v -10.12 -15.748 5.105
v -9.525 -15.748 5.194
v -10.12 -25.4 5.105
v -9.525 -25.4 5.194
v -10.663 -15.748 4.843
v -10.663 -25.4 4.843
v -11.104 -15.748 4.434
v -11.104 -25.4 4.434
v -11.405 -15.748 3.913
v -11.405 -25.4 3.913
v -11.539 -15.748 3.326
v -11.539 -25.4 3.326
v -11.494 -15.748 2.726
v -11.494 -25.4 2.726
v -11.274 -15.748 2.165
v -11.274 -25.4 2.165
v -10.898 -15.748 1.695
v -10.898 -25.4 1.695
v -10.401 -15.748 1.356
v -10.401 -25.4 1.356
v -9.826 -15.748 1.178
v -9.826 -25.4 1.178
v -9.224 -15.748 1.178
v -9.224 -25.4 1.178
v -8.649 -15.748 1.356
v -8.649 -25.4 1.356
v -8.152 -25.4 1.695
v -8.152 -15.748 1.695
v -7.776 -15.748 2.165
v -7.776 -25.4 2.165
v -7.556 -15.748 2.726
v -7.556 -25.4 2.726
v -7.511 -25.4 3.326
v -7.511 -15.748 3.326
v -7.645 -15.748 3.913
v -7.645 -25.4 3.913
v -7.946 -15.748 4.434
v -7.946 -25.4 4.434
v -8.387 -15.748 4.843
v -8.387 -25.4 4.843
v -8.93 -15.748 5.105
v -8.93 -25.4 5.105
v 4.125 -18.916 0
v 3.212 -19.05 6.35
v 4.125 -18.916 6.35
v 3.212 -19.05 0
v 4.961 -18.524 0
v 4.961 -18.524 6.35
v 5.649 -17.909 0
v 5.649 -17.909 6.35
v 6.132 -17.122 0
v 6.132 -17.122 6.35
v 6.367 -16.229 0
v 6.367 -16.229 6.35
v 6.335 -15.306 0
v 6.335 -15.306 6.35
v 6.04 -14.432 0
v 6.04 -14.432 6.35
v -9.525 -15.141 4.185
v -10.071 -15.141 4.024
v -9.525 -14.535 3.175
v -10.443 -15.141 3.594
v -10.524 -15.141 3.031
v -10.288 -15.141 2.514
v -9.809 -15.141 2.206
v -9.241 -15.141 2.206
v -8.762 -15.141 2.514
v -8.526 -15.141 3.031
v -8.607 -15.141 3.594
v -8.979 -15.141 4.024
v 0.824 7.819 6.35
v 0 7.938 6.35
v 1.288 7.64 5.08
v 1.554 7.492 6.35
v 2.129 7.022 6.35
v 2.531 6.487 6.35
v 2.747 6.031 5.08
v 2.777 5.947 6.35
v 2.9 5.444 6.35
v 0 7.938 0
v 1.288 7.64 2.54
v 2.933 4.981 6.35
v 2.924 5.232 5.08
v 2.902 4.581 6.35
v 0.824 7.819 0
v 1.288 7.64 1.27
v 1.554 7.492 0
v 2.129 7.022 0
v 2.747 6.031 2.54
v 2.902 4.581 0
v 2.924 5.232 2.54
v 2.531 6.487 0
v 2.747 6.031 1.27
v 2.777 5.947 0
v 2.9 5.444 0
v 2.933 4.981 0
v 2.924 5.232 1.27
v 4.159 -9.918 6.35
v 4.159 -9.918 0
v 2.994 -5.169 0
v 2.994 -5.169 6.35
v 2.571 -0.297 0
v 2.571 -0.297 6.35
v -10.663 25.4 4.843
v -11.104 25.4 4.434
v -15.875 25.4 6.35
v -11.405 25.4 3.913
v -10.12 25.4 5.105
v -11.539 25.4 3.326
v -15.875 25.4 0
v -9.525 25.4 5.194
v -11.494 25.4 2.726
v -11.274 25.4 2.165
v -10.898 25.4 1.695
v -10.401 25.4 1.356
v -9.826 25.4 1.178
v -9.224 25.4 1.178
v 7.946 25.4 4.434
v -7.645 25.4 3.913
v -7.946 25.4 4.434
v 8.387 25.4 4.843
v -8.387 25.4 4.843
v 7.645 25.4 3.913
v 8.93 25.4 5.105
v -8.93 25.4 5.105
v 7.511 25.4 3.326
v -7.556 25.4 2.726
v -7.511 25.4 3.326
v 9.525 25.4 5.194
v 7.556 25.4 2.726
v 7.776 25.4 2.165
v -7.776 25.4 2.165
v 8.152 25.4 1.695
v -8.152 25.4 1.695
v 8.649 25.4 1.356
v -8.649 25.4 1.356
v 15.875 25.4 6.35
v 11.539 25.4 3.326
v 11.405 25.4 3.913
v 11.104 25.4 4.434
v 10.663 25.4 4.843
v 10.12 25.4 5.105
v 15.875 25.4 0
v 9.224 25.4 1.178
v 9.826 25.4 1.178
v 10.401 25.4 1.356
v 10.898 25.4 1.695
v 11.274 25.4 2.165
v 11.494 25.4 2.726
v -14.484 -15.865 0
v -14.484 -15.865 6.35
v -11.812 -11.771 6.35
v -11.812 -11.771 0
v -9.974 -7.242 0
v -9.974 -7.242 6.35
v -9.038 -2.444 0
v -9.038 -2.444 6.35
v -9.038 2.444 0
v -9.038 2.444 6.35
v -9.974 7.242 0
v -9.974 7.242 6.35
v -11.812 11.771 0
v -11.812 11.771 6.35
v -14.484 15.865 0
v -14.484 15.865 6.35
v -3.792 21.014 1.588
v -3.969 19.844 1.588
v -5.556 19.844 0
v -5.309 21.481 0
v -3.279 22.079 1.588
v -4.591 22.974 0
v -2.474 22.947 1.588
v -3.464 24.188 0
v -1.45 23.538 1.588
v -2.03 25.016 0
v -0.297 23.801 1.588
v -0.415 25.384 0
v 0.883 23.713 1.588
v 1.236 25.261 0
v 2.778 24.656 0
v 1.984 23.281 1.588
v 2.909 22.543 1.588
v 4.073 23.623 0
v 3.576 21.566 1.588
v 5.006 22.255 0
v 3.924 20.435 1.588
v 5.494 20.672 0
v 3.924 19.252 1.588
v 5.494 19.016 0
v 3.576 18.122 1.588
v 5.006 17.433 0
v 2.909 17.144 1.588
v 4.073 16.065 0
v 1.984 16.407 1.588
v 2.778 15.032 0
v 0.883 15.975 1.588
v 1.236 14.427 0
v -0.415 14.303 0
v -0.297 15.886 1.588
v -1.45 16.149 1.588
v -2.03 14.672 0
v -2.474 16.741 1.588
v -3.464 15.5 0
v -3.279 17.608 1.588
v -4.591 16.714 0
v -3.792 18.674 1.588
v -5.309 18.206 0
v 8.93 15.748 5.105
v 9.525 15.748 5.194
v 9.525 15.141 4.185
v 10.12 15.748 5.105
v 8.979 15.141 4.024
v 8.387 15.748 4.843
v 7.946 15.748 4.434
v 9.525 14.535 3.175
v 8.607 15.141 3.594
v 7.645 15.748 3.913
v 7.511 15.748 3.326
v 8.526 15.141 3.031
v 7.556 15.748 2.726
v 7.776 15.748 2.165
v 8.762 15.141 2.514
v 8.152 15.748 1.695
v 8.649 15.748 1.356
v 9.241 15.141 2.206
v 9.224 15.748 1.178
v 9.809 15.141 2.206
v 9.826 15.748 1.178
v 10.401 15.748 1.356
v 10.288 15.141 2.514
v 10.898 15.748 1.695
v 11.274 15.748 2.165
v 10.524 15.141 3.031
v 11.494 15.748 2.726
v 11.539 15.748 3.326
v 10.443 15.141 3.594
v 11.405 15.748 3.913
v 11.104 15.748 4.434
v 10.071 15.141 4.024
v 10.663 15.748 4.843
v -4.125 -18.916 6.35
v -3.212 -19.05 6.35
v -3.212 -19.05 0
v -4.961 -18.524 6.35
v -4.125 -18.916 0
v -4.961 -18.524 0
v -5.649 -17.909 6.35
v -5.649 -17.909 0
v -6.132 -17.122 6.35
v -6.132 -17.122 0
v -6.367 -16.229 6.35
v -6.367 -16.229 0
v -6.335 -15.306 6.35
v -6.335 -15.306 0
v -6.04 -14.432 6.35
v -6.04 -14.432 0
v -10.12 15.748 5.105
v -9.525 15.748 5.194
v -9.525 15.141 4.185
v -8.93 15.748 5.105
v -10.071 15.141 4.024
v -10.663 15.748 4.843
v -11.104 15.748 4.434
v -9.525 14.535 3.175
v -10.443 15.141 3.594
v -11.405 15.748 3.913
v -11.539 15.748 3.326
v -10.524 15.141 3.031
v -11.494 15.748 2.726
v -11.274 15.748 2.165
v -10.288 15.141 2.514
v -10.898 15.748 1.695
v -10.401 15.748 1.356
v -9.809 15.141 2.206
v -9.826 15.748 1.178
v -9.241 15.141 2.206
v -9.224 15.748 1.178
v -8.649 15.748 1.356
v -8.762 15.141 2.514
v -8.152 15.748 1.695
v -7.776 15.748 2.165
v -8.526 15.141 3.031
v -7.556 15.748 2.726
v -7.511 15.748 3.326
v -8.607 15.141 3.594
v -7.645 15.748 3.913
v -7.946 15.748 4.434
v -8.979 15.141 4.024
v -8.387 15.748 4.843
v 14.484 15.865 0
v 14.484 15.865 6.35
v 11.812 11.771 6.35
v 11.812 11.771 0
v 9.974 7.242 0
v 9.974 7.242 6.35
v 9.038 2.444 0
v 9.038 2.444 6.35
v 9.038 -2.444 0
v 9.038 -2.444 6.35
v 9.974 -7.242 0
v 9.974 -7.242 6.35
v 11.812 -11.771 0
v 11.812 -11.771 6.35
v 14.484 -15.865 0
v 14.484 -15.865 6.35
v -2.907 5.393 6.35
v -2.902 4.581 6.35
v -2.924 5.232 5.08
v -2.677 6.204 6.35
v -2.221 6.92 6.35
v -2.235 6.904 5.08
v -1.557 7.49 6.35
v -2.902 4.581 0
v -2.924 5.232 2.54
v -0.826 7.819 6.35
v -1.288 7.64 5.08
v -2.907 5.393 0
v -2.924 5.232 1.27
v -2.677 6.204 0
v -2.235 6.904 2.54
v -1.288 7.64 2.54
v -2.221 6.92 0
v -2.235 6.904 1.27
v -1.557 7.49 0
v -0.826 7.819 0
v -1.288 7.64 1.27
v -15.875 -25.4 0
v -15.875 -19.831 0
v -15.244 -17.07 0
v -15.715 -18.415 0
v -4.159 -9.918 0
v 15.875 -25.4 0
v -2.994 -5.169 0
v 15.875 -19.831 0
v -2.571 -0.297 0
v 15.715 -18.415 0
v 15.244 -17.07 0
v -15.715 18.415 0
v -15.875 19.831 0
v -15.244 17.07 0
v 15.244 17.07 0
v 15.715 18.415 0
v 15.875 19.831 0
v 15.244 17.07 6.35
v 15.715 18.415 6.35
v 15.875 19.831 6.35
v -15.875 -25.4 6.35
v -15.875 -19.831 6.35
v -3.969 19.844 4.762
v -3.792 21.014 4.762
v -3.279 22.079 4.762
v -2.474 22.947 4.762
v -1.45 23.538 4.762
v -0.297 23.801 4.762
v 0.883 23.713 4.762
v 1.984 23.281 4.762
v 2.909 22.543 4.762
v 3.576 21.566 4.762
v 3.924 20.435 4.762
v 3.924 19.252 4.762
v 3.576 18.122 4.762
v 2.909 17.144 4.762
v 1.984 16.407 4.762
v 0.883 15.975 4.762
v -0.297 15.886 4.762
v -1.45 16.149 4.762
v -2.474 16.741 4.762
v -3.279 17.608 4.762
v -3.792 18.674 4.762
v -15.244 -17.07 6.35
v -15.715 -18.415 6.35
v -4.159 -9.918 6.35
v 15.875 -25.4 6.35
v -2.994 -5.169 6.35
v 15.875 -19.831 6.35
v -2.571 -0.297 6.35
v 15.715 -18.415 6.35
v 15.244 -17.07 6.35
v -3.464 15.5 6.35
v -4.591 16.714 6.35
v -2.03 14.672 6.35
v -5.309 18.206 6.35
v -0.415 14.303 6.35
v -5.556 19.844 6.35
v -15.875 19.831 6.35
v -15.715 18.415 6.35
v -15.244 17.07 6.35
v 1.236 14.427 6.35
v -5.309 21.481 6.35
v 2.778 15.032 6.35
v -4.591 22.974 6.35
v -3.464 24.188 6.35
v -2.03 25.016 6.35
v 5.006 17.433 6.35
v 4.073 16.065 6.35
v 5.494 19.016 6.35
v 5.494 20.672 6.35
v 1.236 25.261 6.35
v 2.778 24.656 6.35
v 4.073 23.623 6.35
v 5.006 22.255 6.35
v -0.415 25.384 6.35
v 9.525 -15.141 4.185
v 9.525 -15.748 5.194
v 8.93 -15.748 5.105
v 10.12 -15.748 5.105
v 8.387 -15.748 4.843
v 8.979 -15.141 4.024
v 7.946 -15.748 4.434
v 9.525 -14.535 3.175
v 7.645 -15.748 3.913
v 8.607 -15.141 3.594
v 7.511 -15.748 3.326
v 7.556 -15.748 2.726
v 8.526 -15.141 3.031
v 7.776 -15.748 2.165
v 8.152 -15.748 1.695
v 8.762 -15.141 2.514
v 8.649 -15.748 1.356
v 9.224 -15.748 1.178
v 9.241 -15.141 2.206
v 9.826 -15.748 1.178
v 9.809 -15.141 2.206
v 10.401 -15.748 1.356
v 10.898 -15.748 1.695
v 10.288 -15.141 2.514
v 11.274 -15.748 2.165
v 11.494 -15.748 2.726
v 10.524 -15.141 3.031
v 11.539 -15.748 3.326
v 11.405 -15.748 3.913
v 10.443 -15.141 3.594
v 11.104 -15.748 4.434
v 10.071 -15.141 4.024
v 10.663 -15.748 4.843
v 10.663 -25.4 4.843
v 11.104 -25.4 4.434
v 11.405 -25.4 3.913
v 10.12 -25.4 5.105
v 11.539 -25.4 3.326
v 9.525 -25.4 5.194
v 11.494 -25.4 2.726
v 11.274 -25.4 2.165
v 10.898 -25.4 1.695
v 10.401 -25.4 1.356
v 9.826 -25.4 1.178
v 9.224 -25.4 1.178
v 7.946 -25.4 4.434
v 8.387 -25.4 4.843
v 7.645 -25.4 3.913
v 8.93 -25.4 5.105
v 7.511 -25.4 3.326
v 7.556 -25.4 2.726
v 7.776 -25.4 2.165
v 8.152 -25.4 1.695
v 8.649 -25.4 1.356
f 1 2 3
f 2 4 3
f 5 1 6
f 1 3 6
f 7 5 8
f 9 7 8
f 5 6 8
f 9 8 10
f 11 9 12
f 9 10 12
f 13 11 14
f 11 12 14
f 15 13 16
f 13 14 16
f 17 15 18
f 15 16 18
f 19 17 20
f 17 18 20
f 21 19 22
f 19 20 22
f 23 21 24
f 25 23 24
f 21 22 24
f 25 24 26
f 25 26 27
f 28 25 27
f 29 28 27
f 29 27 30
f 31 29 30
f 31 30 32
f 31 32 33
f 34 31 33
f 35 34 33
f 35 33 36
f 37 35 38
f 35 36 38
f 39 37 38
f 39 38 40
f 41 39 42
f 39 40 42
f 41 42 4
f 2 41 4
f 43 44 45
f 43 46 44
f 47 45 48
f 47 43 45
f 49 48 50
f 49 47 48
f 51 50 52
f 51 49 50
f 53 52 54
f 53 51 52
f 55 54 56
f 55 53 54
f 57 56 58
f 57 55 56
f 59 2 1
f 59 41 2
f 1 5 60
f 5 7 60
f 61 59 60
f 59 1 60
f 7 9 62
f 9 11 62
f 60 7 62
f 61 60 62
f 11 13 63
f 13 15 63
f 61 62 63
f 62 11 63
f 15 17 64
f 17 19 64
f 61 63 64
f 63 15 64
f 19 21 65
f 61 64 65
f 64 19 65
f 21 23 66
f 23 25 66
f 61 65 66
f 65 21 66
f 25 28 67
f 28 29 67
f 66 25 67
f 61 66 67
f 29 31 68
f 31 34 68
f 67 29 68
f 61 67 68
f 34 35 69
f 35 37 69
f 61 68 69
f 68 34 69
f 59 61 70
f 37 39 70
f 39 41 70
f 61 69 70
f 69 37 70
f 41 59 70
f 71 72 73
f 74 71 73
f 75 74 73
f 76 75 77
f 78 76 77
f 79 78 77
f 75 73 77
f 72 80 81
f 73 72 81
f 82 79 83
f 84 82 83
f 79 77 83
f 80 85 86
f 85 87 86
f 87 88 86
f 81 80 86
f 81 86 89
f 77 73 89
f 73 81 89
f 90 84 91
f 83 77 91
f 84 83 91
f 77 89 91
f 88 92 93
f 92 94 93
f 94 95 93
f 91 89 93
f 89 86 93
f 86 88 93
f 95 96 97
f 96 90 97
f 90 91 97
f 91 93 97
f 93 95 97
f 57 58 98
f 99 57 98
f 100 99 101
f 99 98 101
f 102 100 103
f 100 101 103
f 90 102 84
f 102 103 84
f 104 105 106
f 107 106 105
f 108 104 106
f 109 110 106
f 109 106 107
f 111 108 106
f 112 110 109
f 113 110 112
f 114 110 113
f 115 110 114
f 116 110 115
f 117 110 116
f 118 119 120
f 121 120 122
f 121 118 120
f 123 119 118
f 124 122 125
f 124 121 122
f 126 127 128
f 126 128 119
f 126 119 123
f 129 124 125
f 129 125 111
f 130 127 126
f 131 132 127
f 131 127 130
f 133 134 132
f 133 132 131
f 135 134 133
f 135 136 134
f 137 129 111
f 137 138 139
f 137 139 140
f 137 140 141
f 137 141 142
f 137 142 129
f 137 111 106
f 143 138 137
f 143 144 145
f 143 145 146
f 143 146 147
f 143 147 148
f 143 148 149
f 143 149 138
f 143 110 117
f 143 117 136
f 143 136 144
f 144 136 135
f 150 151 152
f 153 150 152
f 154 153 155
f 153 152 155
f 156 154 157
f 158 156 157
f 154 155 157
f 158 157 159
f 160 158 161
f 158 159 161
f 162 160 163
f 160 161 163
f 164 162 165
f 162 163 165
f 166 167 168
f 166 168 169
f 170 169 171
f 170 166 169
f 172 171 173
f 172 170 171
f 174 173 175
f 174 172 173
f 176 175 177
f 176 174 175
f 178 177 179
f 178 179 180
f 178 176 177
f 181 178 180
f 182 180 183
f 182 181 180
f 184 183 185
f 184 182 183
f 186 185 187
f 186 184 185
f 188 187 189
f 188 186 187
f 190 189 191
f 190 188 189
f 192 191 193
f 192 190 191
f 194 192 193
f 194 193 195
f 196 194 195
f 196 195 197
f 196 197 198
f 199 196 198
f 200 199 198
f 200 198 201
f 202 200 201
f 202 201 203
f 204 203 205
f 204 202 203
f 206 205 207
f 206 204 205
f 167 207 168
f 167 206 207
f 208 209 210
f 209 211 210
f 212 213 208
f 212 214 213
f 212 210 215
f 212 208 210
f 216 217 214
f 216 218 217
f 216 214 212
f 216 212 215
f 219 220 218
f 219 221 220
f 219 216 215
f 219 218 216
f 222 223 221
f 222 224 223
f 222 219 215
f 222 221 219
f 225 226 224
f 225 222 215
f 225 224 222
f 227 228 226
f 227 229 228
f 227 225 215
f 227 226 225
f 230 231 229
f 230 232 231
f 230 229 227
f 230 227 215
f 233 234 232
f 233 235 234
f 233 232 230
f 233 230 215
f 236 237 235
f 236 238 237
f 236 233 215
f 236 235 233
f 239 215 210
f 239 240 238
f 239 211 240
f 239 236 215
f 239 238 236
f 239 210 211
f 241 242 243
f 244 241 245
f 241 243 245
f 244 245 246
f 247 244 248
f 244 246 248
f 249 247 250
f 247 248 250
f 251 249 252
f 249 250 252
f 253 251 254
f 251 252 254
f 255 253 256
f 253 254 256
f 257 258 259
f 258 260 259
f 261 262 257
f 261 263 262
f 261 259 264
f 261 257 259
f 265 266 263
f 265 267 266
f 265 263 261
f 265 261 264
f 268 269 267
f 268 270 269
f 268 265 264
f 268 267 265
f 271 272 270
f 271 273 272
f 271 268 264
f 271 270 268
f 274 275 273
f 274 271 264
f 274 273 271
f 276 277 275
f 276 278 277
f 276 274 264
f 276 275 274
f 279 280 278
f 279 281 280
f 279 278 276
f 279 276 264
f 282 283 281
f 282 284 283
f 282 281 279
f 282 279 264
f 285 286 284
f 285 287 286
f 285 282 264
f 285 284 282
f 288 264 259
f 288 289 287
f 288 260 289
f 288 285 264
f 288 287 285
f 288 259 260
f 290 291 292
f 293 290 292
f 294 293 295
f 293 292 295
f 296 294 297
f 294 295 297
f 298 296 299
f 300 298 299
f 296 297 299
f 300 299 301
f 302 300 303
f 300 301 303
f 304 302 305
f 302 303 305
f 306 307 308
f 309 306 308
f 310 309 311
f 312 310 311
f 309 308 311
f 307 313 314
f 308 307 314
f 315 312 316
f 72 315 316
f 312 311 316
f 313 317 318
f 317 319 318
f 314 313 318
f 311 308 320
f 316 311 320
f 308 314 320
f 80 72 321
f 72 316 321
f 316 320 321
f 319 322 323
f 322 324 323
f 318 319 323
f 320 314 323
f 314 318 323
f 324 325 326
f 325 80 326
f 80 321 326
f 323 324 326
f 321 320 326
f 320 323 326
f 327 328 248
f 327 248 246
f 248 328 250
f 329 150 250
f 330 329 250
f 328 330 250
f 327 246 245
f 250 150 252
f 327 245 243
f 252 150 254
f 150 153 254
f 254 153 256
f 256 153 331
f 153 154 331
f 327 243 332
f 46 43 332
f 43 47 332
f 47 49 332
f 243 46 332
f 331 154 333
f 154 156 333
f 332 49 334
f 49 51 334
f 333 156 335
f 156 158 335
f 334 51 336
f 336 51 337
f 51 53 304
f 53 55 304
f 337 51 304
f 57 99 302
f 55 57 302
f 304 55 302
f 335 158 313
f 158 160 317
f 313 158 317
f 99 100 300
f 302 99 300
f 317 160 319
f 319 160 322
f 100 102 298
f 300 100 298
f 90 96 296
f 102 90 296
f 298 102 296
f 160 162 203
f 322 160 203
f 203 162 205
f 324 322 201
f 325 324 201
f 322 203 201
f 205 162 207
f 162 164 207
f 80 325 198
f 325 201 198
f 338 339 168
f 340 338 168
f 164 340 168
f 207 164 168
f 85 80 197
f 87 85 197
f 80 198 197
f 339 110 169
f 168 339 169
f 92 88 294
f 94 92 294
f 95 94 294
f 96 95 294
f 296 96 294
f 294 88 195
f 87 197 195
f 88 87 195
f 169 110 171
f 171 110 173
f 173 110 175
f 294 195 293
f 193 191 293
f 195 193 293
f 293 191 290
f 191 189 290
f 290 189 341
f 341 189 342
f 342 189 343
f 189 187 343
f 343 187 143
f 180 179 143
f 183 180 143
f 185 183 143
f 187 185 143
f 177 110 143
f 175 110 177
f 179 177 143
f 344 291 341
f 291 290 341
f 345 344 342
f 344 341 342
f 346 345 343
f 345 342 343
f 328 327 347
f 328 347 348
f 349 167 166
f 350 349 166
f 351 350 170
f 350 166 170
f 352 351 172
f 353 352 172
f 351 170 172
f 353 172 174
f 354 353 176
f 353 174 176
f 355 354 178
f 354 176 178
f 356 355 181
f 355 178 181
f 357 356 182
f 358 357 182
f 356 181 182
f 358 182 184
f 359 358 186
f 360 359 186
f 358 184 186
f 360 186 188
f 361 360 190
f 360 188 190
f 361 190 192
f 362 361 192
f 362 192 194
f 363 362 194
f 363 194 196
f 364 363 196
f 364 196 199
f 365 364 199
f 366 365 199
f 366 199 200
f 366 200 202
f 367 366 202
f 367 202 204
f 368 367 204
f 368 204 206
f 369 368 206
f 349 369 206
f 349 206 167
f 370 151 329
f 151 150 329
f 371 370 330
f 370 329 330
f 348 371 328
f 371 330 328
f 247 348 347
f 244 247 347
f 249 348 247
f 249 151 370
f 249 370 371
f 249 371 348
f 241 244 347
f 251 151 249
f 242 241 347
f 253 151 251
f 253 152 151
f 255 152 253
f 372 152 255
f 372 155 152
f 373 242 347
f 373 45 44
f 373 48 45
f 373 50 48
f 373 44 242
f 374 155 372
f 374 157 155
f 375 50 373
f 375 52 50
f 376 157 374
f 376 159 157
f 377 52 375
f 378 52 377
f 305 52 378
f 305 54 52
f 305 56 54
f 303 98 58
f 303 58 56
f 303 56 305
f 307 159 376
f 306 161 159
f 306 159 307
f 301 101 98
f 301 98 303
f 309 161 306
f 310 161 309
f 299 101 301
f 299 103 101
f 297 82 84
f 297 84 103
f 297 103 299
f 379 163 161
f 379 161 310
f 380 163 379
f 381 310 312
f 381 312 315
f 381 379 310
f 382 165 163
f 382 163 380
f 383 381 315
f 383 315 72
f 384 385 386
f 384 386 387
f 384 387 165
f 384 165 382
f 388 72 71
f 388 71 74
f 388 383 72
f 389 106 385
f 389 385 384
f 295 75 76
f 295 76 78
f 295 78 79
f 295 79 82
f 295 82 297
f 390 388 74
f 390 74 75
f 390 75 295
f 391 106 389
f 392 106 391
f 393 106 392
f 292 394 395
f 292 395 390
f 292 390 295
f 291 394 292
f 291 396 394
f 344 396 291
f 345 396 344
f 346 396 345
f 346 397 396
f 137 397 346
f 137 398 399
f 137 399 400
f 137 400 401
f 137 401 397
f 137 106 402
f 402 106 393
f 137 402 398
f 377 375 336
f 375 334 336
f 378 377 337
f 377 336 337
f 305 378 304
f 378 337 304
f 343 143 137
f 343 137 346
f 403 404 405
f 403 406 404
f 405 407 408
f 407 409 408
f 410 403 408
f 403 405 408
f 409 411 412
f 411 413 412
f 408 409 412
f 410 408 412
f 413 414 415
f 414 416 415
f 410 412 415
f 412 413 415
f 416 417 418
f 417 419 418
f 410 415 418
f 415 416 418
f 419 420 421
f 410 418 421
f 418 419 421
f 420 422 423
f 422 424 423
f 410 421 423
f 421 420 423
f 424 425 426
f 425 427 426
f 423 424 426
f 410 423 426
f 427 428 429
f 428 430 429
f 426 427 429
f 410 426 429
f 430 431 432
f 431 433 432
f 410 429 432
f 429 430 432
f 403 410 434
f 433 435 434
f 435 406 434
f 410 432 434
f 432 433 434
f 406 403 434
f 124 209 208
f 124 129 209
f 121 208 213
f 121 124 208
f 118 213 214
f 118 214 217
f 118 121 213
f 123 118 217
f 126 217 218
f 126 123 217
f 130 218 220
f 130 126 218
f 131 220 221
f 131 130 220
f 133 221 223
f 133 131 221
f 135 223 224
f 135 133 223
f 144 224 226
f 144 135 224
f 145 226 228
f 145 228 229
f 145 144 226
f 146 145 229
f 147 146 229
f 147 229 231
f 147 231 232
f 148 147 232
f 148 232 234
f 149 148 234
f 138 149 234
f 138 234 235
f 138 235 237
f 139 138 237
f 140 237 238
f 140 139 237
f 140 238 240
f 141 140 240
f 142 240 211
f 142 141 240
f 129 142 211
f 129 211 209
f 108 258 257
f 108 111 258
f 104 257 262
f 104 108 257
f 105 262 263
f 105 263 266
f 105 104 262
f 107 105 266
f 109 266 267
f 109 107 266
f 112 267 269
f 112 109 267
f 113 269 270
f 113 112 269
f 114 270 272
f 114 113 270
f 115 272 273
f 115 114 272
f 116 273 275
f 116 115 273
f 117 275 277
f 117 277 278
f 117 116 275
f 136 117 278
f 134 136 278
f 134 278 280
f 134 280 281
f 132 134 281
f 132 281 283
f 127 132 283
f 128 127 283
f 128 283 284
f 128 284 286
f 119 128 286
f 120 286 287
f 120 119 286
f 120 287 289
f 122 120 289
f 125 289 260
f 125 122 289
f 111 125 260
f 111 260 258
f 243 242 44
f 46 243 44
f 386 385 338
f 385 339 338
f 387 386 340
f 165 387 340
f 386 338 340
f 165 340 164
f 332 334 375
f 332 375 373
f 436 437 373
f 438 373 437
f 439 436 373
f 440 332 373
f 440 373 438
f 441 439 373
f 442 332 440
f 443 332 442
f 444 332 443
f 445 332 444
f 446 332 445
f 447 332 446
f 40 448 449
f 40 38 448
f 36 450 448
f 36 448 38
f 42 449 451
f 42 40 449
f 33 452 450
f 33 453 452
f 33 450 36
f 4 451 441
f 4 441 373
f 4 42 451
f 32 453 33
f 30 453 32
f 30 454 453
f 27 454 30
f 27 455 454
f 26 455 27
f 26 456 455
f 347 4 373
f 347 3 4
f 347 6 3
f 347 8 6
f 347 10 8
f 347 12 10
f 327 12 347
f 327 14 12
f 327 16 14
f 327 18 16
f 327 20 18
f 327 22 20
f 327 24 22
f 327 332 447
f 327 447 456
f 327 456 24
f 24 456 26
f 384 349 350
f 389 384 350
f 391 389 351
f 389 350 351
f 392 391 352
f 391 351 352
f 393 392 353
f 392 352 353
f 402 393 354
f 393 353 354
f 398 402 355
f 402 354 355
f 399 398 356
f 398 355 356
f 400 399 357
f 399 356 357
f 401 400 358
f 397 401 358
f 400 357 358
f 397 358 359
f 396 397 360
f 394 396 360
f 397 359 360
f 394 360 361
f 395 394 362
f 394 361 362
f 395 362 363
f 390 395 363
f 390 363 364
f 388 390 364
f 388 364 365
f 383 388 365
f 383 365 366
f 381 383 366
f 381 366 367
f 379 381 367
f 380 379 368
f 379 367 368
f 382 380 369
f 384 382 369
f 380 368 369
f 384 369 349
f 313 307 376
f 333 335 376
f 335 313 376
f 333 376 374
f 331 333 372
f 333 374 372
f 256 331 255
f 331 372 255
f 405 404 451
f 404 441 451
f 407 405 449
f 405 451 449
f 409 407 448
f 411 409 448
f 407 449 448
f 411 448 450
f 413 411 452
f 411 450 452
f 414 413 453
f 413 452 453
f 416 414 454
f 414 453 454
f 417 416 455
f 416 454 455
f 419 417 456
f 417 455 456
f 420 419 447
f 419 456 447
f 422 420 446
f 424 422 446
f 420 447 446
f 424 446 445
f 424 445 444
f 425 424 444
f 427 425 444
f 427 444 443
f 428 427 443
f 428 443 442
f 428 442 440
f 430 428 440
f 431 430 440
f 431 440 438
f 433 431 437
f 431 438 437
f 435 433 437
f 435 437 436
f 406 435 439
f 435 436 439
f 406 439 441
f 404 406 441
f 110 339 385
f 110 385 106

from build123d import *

# Parameters (mm, degrees)
BOSS_EXTRUDE1_DEPTH                = 6.35
F_10_32_TAPPED_HOLE1_AT_2_COUNT    = 2
F_10_32_TAPPED_HOLE1_AT_2_PITCH    = 19.05
F_5_16_0_3125_DIAMETER_HOLE1_D     = 7.9375
F_5_16_0_3125_DIAMETER_HOLE1_DEPTH = 10.668
F_5_16_0_3125_DIAMETER_HOLE1_TIP   = 2.38466558176563
CHAMFER1_SIZE                      = 1.5875
CUT_EXTRUDE1_DEPTH                 = 31.61859116615264
FILLET1_R                          = 6.35
CUT_EXTRUDE2_DEPTH                 = 31.61859116615264
FILLET2_R                          = 3.175
FILLET3_DEPTH                      = 6.35


with BuildPart() as part:
    # Sketch1 → Boss-Extrude1 (new body)
    with BuildSketch(Plane.XY):
        Polygon((-15.875000000000007, 25.400000000000006), (15.874999999999993, 25.400000000000006), (15.875, -25.39999999999999), (-15.875, -25.39999999999999), align=None)
    extrude(amount=BOSS_EXTRUDE1_DEPTH)

    # Sketch3 → #10-32 Tapped Hole1 (revolve, cut)
    with BuildSketch(Plane(origin=(-9.525000000000007, 25.400000000000006, 3.175000000000004), x_dir=(0, 0, 1), z_dir=(1, 0, 0))):
        Polygon((0, 0), (-2.66e-15, 10.865317848002352), (2.0192999999999977, 9.652), (2.0192999999999985, 4e-17), align=None)
    f_10_32_tapped_hole1 = revolve(axis=Axis((-9.525000000000007, 31.749999999999996, 3.175000000000004), (0, -1, 0)), mode=Mode.SUBTRACT)

    # #10-32 Tapped Hole1 at 2: #10-32 Tapped Hole1 ×2
    with Locations(*[(i * F_10_32_TAPPED_HOLE1_AT_2_PITCH, 0, 0) for i in range(1, F_10_32_TAPPED_HOLE1_AT_2_COUNT)]):
        add(f_10_32_tapped_hole1, mode=Mode.SUBTRACT)

    # 5/16 (0.3125) Diameter Hole1
    with Locations(Plane.XY.offset(6.35)):
        with Locations((0, 19.84375)):
            Hole(F_5_16_0_3125_DIAMETER_HOLE1_D / 2, depth=F_5_16_0_3125_DIAMETER_HOLE1_DEPTH)
            with Locations((0, 0, -(F_5_16_0_3125_DIAMETER_HOLE1_DEPTH + F_5_16_0_3125_DIAMETER_HOLE1_TIP / 2))):  # 118° drill point
                Cone(0, F_5_16_0_3125_DIAMETER_HOLE1_D / 2, F_5_16_0_3125_DIAMETER_HOLE1_TIP, mode=Mode.SUBTRACT)

    # Chamfer1
    chamfer1_edges = [part.edges().sort_by_distance(p)[0] for p in [
        (3.96875, 19.84375, 0),
        (3.96875, 19.84375, 6.35),
    ]]
    chamfer(chamfer1_edges, length=CHAMFER1_SIZE)

    # Sketch6 → Cut-Extrude1 (cut, through all)
    with BuildSketch(Plane.XY.offset(6.35)):
        with BuildLine():
            Line((-15.875000000000007, 17.462500000000006), (-15.875000000000007, 3.55e-15))
            Line((-15.875000000000007, 3.39e-15), (-8.92008318631283, 4.67e-15))
            ThreePointArc((-8.920083186312826, 3.5971e-13), (-10.722783415657506, 9.398268113531895), (-15.875000000000007, 17.462500000000006))
        make_face()
        with BuildLine():
            Line((-8.92008318631283, 4.67e-15), (-15.875000000000007, 3.39e-15))
            Line((-15.875000000000007, 3.55e-15), (-15.875000000000007, -17.462500000000006))
            ThreePointArc((-15.87500000000001, -17.46250000000001), (-10.722783415657375, -9.39826811353156), (-8.920083186312826, 3.5971e-13))
        make_face()
        with BuildLine():
            ThreePointArc((15.875000000000004, 17.462499999999984), (10.722783415657386, 9.39826811353155), (8.920083186312844, -3.4461e-13))
            Line((8.920083186312851, 7.94e-15), (15.875, 9.22e-15))
            Line((15.875000000000004, 1.066e-14), (15.875000000000004, 17.462499999999984))
        make_face()
        with BuildLine():
            Line((15.875, 9.22e-15), (8.920083186312851, 7.94e-15))
            ThreePointArc((8.920083186312844, -3.4461e-13), (10.722783415657513, -9.398268113531874), (15.875, -17.462499999999984))
            Line((15.875000000000004, -17.462499999999984), (15.875000000000004, 1.066e-14))
        make_face()
    extrude(amount=-CUT_EXTRUDE1_DEPTH, mode=Mode.SUBTRACT)

    # Fillet1
    fillet1_edges = [part.edges().sort_by_distance(p)[0] for p in [
        (15.875000000000002, -17.462499999999984, 3.175),
        (15.875000000000004, 17.462499999999984, 3.175),
        (-15.875000000000009, -17.46250000000001, 3.175),
        (-15.875000000000005, 17.462500000000006, 3.175),
    ]]
    fillet(fillet1_edges, radius=FILLET1_R)

    # Sketch7 → Cut-Extrude2 (cut, through all)
    with BuildSketch(Plane.XY.offset(6.35)):
        with BuildLine():
            Line((-8.92008318631281, -19.04999999999999), (8.920083186312835, -19.049999999999986))
            ThreePointArc((8.920083186312835, -19.049999999999986), (3.1152594113270133, -5.858453138165378), (3.7402393989355516, 8.540237346795667))
            ThreePointArc((3.7402393989355516, 8.540237346795667), (6.02e-15, 7.937499999999989), (-3.740239398935539, 8.540237346795662))
            ThreePointArc((-3.740239398935539, 8.540237346795662), (-3.1152594113270027, -5.858453138165384), (-8.92008318631281, -19.04999999999999))
        make_face()
    extrude(amount=-CUT_EXTRUDE2_DEPTH, mode=Mode.SUBTRACT)

    # Fillet2
    fillet2_edges = [part.edges().sort_by_distance(p)[0] for p in [
        (8.920083186312837, -19.049999999999986, 3.175),
        (-8.920083186312809, -19.04999999999999, 3.175),
    ]]
    fillet(fillet2_edges, radius=FILLET2_R)

    # Mirror1: #10-32 Tapped Hole1 across plane
    add(f_10_32_tapped_hole1.mirror(Plane.ZX), mode=Mode.SUBTRACT)

    # Mirror1 copy 1 sketch → Mirror1 copy 1 (revolve, cut)
    with BuildSketch(Plane(origin=(9.524999999999993, -25.400000000000006, 3.175000000000004), x_dir=(0, 0, 1), z_dir=(1, 0, 0))):
        Polygon((0, 0), (-2.66e-15, -10.865317848002352), (2.0192999999999977, -9.652), (2.0192999999999985, -4e-17), align=None)
    revolve(axis=Axis((9.524999999999993, -31.749999999999996, 3.175000000000004), (0, -1, 0)), mode=Mode.SUBTRACT)

    # Fillet3: read off the stored shape, not the designer's step
    # Fillet3 outline → Fillet3 (add)
    with BuildSketch(Plane.XY):
        with BuildLine():
            ThreePointArc((-3.740239399, 8.540237347), (-3.258151648, 6.574108997), (-2.902339746, 4.581254969))
            add(Edge.make_bspline(
                [(-2.902339746, 4.581254969), (-3.0109534907888404, 5.326116105248684), (-2.9047701826802874, 6.25797221448604), (-2.3933426209054938, 7.245588905615834), (-1.356695523735085, 7.937499999999987), (0, 7.9375)],
                knots=[0, 0, 0, 0, 0, 0, 0.5, 0.5, 0.5, 0.5, 0.5, 0.5], degree=5, weights=[1, 0.7711417009817829, 0.5994979767181202, 0.48506882720901173, 0.4278542524544575, 0.4278542524544575]))
            ThreePointArc((0, 7.9375), (-1.894246762, 8.089150123), (-3.740239399, 8.540237347))
        make_face()
        with BuildLine():
            ThreePointArc((3.740239399, 8.540237347), (1.894246748, 8.089150121), (-1.5e-08, 7.9375))
            add(Edge.make_bspline(
                [(-1.5e-08, 7.9375), (1.3566955237351, 7.937499999999984), (2.393342620905507, 7.245588905615829), (2.904770182680299, 6.257972214486036), (3.01095349078885, 5.326116105248681), (2.902339746, 4.581254969)],
                knots=[0.5, 0.5, 0.5, 0.5, 0.5, 0.5, 1, 1, 1, 1, 1, 1], degree=5, weights=[0.4278542524544575, 0.4278542524544575, 0.48506882720901173, 0.5994979767181202, 0.7711417009817829, 1]))
            ThreePointArc((2.902339746, 4.581254969), (3.258151648, 6.574108997), (3.740239399, 8.540237347))
        make_face()
    extrude(amount=FILLET3_DEPTH)


solid = part.part
